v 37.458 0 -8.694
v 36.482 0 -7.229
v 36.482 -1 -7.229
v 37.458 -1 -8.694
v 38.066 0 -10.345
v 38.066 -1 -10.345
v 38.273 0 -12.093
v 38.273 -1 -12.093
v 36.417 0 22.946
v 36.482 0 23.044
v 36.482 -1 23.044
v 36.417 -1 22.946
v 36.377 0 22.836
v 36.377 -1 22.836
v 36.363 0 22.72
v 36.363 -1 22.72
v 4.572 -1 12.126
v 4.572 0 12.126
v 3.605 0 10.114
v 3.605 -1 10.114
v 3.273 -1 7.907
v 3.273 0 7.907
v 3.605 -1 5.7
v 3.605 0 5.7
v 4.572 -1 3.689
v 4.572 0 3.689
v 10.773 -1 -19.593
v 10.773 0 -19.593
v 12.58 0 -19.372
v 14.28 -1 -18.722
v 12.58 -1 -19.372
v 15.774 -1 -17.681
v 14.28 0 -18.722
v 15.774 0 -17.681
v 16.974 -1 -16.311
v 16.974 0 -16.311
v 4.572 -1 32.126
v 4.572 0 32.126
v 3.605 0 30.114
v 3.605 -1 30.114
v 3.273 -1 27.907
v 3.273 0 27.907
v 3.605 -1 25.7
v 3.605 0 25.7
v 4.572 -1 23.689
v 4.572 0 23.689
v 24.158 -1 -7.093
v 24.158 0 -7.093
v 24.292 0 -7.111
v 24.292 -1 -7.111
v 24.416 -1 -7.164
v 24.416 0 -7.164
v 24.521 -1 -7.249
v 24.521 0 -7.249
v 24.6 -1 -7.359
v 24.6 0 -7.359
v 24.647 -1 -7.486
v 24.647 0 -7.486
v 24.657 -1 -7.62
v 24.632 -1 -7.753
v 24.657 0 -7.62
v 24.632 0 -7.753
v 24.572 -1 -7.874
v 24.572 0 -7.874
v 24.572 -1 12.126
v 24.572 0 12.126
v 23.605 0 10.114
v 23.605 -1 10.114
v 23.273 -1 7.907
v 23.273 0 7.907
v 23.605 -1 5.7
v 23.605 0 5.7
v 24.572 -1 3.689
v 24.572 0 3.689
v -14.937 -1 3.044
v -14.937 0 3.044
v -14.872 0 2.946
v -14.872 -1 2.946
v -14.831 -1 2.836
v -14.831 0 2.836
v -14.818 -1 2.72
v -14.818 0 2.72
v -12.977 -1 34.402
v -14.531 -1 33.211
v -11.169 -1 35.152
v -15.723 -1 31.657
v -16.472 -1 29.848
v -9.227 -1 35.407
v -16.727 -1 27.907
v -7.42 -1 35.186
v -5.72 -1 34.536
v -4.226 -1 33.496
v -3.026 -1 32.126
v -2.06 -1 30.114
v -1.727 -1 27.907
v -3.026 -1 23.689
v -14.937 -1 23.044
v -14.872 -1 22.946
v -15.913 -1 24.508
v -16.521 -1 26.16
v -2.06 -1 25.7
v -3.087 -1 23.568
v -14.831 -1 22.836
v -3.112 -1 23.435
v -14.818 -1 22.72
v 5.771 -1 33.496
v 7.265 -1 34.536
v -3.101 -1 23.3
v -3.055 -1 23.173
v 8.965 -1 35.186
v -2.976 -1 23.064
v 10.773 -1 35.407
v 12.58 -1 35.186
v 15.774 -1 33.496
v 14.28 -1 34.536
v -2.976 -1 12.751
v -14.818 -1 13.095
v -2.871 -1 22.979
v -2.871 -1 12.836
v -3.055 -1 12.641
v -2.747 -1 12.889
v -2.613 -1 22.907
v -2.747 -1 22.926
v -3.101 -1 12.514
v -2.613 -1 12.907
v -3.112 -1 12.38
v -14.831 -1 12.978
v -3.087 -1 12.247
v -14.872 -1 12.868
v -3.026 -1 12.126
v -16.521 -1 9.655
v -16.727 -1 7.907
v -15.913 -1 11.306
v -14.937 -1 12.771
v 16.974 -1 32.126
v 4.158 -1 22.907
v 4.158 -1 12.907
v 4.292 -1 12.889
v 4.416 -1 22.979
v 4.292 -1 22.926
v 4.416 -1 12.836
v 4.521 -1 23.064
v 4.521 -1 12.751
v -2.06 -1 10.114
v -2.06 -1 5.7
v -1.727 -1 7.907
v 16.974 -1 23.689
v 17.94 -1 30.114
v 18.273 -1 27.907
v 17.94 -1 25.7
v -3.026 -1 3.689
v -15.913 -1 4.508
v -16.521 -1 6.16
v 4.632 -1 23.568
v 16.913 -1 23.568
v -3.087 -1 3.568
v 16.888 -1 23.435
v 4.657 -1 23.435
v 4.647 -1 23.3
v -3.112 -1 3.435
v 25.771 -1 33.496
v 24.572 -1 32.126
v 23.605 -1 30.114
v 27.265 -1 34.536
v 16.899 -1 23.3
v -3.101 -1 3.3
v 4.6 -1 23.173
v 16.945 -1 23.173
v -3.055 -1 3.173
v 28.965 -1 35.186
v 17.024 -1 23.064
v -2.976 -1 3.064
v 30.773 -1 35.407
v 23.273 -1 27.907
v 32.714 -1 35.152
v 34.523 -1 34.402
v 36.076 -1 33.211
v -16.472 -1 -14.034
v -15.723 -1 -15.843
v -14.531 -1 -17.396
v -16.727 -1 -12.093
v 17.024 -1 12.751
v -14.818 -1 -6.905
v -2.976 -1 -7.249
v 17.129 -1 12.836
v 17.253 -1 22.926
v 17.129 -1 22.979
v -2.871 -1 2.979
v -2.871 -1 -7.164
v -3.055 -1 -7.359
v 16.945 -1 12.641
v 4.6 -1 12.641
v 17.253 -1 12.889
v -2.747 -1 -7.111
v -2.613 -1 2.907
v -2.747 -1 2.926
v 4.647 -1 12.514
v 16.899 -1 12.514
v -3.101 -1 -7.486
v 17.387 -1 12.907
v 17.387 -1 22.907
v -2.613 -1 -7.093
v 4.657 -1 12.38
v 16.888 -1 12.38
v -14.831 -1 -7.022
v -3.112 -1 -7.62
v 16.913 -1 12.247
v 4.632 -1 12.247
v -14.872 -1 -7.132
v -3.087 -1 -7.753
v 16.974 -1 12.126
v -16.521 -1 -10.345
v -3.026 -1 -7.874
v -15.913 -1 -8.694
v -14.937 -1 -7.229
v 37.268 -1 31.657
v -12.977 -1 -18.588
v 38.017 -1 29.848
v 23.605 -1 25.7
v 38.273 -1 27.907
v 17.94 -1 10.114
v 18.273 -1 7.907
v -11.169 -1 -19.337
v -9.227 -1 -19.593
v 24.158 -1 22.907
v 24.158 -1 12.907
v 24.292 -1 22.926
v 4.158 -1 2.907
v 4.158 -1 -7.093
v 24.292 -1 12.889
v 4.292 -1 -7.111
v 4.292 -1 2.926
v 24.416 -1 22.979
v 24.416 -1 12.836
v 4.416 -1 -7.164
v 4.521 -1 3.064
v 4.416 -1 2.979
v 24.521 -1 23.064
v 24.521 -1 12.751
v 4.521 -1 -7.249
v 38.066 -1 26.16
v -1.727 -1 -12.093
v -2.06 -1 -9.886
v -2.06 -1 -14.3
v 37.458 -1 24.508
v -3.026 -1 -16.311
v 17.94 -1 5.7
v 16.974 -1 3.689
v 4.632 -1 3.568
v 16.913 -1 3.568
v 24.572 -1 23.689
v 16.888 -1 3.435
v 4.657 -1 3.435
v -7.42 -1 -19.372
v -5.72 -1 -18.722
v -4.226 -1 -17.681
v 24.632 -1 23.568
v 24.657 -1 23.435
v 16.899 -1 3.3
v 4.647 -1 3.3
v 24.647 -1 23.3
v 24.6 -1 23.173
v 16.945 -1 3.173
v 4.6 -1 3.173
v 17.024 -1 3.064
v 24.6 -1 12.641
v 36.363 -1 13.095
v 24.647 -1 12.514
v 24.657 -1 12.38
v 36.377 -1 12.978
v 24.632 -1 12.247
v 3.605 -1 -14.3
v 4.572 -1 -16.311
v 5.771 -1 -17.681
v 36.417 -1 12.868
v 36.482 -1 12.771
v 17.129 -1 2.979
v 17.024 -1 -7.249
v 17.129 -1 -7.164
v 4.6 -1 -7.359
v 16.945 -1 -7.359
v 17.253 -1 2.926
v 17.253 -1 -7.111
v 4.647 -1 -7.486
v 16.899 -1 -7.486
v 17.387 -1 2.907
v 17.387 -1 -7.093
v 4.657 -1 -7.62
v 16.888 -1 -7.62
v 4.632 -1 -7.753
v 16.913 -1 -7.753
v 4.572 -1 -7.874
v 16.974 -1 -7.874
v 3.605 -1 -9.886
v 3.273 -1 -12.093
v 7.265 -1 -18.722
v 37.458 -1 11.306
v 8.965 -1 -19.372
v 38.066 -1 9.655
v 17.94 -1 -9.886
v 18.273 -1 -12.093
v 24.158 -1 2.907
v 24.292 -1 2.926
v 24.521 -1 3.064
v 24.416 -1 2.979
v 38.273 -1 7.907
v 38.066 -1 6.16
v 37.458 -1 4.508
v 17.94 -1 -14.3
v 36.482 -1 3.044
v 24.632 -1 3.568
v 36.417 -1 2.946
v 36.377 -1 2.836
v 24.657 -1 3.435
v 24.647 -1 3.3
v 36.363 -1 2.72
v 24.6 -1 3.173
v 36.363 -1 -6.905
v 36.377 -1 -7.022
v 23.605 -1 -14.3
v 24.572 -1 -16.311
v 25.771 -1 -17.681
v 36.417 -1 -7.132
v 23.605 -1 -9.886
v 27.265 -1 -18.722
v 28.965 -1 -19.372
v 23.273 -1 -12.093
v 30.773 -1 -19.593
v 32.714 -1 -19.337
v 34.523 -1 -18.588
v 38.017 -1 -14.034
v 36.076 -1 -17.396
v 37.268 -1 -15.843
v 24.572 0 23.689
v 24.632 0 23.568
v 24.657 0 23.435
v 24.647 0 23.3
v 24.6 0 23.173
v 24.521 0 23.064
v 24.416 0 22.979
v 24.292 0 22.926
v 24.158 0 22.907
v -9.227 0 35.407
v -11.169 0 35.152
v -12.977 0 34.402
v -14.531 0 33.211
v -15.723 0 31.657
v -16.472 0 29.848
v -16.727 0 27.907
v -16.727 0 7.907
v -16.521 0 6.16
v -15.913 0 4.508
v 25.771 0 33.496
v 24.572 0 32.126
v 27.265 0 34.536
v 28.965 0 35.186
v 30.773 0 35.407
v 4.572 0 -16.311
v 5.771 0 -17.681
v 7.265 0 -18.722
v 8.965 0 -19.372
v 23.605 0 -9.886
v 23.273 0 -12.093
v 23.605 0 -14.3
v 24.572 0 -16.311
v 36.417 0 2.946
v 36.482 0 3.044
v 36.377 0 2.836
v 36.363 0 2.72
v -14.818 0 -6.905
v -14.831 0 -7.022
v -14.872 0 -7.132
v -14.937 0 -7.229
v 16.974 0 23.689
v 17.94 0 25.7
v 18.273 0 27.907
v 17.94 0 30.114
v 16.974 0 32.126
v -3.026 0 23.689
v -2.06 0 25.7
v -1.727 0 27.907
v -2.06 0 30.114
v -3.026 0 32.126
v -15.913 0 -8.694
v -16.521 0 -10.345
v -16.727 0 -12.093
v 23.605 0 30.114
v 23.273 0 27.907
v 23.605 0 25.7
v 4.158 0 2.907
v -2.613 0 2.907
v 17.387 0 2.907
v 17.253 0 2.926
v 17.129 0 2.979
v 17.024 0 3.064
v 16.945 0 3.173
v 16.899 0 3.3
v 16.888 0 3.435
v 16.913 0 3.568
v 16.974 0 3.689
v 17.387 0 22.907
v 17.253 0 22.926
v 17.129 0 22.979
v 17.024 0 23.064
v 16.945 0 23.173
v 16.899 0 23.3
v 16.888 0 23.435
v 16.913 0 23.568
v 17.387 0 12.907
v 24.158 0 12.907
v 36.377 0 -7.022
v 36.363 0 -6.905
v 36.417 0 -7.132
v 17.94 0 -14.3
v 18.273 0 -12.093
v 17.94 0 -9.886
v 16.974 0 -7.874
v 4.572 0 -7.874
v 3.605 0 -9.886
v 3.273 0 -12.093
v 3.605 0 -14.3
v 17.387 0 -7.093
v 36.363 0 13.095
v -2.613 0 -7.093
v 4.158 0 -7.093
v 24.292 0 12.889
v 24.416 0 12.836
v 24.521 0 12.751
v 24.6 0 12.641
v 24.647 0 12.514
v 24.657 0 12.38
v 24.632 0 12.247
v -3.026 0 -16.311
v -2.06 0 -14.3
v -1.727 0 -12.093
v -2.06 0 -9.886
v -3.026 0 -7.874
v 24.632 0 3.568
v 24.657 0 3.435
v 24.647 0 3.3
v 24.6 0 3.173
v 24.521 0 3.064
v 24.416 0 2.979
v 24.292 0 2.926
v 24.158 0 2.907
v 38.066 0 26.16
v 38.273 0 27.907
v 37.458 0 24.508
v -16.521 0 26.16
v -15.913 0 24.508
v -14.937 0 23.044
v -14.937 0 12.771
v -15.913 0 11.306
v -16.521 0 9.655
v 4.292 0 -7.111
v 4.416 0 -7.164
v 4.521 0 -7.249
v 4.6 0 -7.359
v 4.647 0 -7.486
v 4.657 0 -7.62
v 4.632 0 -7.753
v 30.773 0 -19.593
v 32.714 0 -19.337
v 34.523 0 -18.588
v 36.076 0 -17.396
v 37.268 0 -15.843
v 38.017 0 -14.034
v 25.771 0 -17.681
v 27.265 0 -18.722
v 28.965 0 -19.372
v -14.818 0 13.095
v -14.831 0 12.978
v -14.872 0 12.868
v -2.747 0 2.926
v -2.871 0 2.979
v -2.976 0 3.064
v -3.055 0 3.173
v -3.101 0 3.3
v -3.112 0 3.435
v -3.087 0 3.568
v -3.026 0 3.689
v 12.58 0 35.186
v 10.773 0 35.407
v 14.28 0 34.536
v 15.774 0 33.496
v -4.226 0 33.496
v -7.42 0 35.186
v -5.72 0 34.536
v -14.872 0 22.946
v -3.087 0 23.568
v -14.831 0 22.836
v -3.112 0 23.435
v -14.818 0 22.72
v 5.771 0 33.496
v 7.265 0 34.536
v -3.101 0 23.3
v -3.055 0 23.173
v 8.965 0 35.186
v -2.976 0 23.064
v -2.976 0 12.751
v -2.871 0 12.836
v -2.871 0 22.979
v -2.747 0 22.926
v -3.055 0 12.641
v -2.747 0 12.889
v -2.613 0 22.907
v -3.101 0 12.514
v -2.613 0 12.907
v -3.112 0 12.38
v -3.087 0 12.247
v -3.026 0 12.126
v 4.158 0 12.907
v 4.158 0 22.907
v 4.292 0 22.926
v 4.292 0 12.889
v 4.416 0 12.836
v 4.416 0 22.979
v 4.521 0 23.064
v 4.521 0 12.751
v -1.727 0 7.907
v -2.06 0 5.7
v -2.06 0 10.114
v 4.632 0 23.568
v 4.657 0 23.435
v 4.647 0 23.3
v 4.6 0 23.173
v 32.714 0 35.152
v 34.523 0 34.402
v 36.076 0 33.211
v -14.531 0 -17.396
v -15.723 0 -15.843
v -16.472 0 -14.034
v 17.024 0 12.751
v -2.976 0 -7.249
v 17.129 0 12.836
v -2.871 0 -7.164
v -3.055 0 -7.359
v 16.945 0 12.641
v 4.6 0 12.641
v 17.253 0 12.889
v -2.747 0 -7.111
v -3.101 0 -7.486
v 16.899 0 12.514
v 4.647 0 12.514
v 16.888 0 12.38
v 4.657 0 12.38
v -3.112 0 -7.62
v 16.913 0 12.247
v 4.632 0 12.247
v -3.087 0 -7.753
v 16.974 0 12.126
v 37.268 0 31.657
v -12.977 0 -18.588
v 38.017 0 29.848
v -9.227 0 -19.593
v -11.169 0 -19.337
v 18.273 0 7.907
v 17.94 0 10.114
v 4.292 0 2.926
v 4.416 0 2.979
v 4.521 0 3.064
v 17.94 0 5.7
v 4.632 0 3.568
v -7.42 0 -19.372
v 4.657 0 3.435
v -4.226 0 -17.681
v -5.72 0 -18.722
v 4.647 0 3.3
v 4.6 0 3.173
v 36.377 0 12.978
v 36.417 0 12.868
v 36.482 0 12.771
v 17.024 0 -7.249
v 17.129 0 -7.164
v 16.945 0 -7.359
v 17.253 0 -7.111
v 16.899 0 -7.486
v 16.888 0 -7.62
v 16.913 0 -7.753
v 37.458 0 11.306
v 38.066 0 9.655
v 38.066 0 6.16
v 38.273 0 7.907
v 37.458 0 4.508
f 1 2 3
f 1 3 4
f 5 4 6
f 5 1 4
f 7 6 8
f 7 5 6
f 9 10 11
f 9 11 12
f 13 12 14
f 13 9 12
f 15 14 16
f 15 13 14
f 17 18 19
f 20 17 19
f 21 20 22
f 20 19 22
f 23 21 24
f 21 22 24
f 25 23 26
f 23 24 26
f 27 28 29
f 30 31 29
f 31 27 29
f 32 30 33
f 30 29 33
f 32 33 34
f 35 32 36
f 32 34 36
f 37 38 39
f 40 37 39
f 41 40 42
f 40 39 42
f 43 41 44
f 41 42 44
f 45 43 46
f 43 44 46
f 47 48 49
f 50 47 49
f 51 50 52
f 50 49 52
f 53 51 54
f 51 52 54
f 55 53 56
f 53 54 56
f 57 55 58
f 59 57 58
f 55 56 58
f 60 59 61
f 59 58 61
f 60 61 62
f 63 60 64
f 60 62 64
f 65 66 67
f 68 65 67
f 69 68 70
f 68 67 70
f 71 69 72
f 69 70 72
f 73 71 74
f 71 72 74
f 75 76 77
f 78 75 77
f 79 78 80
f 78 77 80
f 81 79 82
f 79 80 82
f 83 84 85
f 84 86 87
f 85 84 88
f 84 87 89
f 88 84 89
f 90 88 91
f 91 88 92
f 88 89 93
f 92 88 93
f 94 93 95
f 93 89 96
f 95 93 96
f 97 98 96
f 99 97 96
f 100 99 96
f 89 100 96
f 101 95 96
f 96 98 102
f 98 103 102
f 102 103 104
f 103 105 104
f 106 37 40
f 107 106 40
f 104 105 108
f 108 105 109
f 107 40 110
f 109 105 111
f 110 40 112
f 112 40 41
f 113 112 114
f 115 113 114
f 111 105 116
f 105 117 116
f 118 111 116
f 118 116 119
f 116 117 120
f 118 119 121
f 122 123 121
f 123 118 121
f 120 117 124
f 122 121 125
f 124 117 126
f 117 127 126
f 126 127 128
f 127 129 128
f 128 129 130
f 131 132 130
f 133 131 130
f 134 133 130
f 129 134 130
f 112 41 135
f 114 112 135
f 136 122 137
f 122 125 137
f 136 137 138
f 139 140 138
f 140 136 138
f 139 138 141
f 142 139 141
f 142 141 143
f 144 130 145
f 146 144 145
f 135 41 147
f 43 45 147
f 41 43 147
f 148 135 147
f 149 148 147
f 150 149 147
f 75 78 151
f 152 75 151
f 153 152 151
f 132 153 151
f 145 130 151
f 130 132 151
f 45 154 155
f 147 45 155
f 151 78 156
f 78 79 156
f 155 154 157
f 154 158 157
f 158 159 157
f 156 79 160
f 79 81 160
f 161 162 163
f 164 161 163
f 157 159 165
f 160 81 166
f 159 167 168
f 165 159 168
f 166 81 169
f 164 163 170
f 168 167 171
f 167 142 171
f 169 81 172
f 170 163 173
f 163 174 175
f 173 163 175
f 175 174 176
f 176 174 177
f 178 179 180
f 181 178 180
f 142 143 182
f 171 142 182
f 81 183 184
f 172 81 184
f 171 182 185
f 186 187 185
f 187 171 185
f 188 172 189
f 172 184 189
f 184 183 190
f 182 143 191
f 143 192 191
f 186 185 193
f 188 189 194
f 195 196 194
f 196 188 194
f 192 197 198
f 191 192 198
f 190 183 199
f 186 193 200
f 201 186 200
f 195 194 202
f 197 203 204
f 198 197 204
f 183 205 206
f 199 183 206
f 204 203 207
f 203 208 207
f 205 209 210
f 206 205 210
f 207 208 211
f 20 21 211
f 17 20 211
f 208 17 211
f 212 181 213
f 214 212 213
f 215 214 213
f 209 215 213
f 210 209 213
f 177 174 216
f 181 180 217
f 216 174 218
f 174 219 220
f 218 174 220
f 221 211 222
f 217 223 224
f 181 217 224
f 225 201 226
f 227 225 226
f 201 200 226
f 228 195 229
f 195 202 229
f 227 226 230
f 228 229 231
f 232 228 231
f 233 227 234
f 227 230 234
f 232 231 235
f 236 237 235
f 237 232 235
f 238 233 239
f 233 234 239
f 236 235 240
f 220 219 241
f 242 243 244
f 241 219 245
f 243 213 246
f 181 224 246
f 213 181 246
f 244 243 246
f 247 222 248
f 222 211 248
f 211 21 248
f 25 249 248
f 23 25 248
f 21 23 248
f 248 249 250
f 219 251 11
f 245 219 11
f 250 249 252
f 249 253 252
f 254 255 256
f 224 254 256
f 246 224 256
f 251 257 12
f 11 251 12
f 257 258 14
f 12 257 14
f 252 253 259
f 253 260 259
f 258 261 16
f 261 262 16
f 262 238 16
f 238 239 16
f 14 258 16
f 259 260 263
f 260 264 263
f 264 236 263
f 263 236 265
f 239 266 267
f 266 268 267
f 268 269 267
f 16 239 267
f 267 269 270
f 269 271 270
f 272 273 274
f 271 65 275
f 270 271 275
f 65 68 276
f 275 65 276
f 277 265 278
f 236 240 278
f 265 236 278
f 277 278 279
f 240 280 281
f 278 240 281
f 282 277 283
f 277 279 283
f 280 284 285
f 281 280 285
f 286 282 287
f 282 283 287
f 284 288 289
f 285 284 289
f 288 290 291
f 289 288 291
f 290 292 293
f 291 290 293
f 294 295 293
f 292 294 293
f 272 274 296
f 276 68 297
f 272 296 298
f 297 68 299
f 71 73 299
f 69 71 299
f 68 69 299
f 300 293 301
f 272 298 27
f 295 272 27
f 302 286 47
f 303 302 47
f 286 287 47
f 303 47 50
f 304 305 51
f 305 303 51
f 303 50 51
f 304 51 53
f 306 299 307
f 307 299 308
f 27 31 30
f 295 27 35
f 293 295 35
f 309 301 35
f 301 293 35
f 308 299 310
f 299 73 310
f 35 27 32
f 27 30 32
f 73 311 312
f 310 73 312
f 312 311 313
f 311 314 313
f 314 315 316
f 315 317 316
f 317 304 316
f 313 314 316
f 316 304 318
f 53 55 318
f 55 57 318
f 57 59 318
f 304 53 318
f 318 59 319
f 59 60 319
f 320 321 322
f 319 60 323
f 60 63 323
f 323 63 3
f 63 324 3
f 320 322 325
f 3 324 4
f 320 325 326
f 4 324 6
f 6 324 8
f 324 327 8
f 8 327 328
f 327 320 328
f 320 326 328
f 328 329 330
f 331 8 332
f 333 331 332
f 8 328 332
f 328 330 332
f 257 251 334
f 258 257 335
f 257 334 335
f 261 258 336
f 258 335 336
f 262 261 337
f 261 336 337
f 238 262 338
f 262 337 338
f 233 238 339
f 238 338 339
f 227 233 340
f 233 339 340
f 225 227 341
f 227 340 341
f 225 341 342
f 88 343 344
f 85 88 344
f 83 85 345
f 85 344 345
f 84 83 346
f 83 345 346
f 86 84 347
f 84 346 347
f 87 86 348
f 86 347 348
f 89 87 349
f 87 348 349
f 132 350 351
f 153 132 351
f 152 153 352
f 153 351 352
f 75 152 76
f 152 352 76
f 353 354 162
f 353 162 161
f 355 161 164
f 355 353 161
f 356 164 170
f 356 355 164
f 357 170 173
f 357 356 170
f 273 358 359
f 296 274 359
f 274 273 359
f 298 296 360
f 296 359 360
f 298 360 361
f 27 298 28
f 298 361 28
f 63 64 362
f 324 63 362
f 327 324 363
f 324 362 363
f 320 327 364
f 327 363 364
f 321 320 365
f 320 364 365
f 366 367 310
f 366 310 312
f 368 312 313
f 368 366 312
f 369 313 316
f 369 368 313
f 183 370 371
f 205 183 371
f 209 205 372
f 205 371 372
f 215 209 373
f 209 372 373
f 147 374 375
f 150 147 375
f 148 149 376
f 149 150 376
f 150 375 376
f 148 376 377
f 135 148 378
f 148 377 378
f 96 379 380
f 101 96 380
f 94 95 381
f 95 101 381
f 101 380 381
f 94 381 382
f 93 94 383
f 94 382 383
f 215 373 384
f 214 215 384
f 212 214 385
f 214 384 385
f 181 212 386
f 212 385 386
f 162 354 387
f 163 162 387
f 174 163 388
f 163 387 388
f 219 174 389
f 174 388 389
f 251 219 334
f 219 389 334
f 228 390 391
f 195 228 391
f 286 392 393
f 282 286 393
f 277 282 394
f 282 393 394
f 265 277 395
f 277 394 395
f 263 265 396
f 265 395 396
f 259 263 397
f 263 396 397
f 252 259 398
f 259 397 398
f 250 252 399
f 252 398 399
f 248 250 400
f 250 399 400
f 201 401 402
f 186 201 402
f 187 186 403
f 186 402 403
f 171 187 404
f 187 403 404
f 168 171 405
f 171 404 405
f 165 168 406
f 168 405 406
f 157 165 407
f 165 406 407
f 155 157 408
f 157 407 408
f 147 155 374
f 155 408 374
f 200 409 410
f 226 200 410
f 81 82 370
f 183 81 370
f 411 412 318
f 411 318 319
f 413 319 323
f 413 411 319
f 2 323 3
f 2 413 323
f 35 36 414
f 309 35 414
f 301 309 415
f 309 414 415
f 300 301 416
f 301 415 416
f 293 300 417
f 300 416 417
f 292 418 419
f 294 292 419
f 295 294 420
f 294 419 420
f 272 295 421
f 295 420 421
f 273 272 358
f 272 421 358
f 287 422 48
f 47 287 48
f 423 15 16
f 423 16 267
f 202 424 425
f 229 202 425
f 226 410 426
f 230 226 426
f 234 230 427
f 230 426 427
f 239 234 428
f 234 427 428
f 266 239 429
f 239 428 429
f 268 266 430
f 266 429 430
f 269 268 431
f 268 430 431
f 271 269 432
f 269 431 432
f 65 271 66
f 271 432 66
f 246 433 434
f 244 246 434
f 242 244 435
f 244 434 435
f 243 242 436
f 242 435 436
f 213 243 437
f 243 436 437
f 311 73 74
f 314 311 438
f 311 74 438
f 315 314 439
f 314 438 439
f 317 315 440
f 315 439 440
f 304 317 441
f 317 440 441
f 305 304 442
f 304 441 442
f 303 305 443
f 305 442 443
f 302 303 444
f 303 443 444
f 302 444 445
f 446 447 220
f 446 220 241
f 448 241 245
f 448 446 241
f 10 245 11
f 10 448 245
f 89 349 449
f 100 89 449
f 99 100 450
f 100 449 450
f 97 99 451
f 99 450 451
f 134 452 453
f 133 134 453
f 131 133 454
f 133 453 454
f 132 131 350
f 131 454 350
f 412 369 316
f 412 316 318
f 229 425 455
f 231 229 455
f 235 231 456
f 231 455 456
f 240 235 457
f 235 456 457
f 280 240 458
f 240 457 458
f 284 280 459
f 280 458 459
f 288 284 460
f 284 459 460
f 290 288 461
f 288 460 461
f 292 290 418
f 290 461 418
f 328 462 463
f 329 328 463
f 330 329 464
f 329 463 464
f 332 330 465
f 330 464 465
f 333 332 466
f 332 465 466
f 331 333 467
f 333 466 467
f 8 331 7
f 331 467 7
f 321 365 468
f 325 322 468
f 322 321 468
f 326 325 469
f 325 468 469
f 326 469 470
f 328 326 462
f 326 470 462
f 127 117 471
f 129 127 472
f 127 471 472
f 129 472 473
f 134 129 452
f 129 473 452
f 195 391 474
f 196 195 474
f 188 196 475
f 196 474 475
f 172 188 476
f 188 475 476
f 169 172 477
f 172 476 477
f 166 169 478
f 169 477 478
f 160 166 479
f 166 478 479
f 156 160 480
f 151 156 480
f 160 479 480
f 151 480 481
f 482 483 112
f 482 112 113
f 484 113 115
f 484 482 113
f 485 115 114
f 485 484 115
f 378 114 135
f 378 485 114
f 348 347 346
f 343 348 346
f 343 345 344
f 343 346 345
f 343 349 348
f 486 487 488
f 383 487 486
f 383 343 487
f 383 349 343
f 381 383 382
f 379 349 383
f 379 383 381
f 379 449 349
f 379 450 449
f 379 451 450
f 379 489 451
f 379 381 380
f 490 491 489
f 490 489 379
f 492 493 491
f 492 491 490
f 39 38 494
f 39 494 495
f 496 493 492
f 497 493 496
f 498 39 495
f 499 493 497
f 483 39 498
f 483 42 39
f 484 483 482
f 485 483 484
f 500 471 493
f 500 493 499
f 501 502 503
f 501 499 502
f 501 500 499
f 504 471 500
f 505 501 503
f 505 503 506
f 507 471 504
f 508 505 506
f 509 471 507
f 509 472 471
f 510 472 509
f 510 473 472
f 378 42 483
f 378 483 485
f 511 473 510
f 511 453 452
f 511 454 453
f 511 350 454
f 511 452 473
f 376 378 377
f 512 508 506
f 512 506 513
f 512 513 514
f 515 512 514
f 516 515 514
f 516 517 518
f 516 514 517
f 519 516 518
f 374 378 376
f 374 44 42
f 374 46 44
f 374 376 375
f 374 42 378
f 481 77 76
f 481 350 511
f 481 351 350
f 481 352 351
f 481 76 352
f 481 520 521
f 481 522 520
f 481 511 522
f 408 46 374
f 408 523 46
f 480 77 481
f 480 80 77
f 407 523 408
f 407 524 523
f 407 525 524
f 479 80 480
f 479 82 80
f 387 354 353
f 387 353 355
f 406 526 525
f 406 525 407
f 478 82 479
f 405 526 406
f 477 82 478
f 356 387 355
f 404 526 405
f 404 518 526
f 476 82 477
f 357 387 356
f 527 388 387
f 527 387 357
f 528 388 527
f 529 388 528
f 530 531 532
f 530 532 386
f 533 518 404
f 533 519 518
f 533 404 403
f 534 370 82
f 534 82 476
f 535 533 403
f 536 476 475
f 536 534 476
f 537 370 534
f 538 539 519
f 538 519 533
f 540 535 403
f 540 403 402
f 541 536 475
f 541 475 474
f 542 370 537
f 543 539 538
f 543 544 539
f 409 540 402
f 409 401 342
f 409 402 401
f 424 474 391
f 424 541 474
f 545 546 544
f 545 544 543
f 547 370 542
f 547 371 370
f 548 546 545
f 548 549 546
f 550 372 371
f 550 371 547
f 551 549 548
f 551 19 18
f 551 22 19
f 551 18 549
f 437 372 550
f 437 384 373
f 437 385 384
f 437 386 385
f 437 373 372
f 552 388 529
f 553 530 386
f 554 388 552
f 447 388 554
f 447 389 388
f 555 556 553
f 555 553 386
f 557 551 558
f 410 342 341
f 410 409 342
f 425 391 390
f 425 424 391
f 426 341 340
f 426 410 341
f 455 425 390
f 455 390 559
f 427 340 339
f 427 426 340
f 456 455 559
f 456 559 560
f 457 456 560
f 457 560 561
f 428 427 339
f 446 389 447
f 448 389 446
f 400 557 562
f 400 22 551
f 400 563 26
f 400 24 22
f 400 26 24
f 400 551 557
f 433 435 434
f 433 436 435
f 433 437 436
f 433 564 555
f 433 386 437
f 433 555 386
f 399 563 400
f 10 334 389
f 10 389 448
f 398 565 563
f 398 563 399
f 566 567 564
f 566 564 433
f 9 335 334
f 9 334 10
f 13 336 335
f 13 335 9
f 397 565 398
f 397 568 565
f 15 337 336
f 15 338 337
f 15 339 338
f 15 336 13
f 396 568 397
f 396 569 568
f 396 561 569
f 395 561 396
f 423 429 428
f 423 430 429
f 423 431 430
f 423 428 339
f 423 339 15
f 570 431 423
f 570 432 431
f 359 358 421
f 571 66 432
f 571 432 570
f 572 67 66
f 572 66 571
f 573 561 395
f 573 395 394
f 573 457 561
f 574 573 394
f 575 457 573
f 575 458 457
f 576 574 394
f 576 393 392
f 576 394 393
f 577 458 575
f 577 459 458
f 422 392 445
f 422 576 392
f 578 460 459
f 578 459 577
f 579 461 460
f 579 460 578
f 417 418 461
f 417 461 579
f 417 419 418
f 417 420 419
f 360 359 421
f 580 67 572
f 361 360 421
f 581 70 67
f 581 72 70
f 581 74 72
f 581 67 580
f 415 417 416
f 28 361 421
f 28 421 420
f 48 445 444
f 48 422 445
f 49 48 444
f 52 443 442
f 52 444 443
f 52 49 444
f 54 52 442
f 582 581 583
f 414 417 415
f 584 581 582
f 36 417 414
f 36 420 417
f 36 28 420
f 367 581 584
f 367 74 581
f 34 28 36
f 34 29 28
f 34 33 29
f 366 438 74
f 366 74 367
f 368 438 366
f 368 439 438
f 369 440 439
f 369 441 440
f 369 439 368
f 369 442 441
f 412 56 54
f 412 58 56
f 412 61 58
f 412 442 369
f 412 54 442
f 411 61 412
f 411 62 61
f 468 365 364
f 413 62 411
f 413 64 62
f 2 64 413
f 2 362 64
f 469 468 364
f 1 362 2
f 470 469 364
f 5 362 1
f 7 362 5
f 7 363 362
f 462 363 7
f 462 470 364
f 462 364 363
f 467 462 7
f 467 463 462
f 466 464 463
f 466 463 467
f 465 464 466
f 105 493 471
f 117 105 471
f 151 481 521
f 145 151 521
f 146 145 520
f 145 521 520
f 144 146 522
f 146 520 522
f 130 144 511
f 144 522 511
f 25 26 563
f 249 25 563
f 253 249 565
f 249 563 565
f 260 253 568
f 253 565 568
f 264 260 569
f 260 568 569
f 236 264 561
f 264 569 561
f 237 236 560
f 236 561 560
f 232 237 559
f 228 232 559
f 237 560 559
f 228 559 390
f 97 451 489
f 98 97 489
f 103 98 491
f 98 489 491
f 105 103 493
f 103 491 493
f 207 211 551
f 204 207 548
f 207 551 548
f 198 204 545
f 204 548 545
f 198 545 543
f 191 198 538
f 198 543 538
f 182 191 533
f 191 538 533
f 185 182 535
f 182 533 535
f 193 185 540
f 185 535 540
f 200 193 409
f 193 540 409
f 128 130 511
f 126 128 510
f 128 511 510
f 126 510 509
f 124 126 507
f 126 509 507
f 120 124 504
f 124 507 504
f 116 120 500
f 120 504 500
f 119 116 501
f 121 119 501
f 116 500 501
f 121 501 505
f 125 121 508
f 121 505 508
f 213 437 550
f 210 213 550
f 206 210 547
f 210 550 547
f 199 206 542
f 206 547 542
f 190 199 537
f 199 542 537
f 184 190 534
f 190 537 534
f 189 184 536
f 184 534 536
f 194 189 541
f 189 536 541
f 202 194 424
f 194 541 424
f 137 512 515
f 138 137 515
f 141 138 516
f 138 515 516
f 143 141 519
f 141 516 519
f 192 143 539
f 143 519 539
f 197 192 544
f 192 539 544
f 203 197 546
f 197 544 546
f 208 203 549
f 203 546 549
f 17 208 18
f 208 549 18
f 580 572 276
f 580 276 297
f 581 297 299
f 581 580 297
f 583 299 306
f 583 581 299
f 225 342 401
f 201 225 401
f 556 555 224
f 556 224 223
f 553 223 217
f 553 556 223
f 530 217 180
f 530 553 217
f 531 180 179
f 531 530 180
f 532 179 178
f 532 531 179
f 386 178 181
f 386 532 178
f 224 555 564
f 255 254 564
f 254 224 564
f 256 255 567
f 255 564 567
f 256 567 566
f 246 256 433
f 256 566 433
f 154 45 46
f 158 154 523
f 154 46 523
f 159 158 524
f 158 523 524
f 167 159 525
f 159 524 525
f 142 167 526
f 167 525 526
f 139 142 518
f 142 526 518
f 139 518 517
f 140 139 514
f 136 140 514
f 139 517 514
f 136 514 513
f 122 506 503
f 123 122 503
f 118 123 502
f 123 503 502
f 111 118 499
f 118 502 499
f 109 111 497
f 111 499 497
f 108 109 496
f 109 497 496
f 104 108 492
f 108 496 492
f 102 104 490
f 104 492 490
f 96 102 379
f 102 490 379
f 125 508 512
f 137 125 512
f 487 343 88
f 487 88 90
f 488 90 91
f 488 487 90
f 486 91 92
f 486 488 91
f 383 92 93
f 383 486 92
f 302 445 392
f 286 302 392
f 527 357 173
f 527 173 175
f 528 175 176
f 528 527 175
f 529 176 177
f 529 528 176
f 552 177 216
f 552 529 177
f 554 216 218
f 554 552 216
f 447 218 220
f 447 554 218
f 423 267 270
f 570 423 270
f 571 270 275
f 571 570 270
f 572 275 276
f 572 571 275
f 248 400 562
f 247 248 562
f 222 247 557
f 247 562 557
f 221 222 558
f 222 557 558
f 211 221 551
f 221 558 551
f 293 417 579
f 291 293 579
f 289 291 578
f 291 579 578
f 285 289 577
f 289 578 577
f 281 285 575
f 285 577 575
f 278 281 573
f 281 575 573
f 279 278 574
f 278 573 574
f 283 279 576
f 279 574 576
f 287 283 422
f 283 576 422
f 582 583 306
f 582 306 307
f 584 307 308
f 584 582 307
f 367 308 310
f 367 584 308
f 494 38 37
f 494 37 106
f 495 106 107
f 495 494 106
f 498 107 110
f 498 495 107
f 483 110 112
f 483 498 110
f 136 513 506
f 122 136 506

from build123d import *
from build123d.topology import SkipClean

# Parameters (mm, degrees)
L_U_BR_IST_W               = 55
L_U_BR_IST_H               = 55
AUFSATZ_LIN_GK_DEPTH       = 1
SCHNITT_LIN_S1_DEPTH       = 2
SCHNITT_LIN_S2_DEPTH       = 2
SCHNITT_LIN_S3_DEPTH       = 2
SCHNITT_LIN_S4_DEPTH       = 2
LIN_MUSTER_S1_COUNT        = 2
LIN_MUSTER_S1_PITCH        = 20
LIN_MUSTER_S1_COUNT_DIR2   = 3
LIN_MUSTER_S1_PITCH_DIR2   = 20
LIN_MUSTER_S2_COUNT        = 2
LIN_MUSTER_S2_PITCH        = 20
LIN_MUSTER_S3_COUNT        = 2
LIN_MUSTER_S3_PITCH        = 20
SPIEGELN_S4_Z_COPY_1_DEPTH = 2
SPIEGELN_S2_COPY_1_DEPTH   = 2
SPIEGELN_S3_COPY_1_DEPTH   = 2
SPIEGELN_S3_COPY_2_DEPTH   = 2


with BuildPart() as part:
    # L_ u Br Ist → Aufsatz-Lin_GK (new body)
    with BuildSketch(Plane(origin=(0, 0, 0), x_dir=(1, 0, 0), z_dir=(0, 1, 0))):
        with Locations((10.772595927, -7.907273432)):
            Rectangle(L_U_BR_IST_W, L_U_BR_IST_H)
    extrude(amount=-AUFSATZ_LIN_GK_DEPTH)

    # Sketch S1 → Schnitt-Lin_S1 (cut, through all)
    with BuildSketch(Plane(origin=(0, 0, 0), x_dir=(1, 0, 0), z_dir=(0, 1, 0))):
        with BuildLine():
            Line((-2.613025796, 7.092726568), (4.158217649, 7.092726568))
            ThreePointArc((4.158217649, 7.092726568), (4.600159387, 7.358872981), (4.571616291, 7.873976568))
            ThreePointArc((4.571616291, 7.873976568), (3.272595927, 12.092726568), (4.571616291, 16.311476568))
            ThreePointArc((4.571616291, 16.311476568), (4.600159387, 16.826580155), (4.158217649, 17.092726568))
            Line((4.158217649, 17.092726568), (-2.613025796, 17.092726568))
            ThreePointArc((-2.613025796, 17.092726568), (-3.054967534, 16.826580155), (-3.026424438, 16.311476568))
            ThreePointArc((-3.026424438, 16.311476568), (-1.727404073, 12.092726568), (-3.026424438, 7.873976568))
            ThreePointArc((-3.026424438, 7.873976568), (-3.054967534, 7.358872981), (-2.613025796, 7.092726568))
        make_face()
    schnitt_lin_s1 = extrude(amount=-SCHNITT_LIN_S1_DEPTH, mode=Mode.SUBTRACT)

    # Sketch S2 → Schnitt-Lin_S2 (cut, through all)
    with BuildSketch(Plane(origin=(0, 0, 0), x_dir=(1, 0, 0), z_dir=(0, 1, 0))):
        with BuildLine():
            Line((-14.817574017, -2.719804872), (-14.817574017, 6.905258008))
            ThreePointArc((-14.817574017, 6.905258008), (-14.848363078, 7.07800376), (-14.936938396, 7.229474793))
            ThreePointArc((-14.936938396, 7.229474793), (-16.26556816, 9.501540297), (-16.727404073, 12.092726568))
            Line((-16.727404073, 12.092726568), (-16.727404073, -7.907273432))
            ThreePointArc((-16.727404073, -7.907273432), (-16.26556816, -5.316087161), (-14.936938396, -3.044021657))
            ThreePointArc((-14.936938396, -3.044021657), (-14.848363078, -2.892550624), (-14.817574017, -2.719804872))
        make_face()
    schnitt_lin_s2 = extrude(amount=-SCHNITT_LIN_S2_DEPTH, mode=Mode.SUBTRACT)

    # Sketch S3 → Schnitt-Lin_S3 (cut, through all)
    with BuildSketch(Plane(origin=(0, 0, 0), x_dir=(1, 0, 0), z_dir=(0, 1, 0))):
        with BuildLine():
            Line((-3.026424438, 16.311476568), (4.571616291, 16.311476568))
            ThreePointArc((4.571616291, 16.311476568), (7.264792127, 18.721852642), (10.772595927, 19.592726568))
            Line((10.772595927, 19.592726568), (-9.227404073, 19.592726568))
            ThreePointArc((-9.227404073, 19.592726568), (-5.719600273, 18.721852642), (-3.026424438, 16.311476568))
        make_face()
    schnitt_lin_s3 = extrude(amount=-SCHNITT_LIN_S3_DEPTH, mode=Mode.SUBTRACT)

    # Sketch S4 → Schnitt-Lin_S4 (cut, through all)
    with SkipClean():  # keep this step's faces unmerged: merging them makes the solid invalid here
        with BuildSketch(Plane(origin=(0, 0, 0), x_dir=(1, 0, 0), z_dir=(0, 1, 0))):
            with BuildLine():
                Line((-16.727404073, 12.092726568), (-16.727404073, 19.592726568))
                Line((-16.727404073, 19.592726568), (-9.227404073, 19.592726568))
                ThreePointArc((-9.227404073, 19.592726568), (-14.530704932, 17.396027427), (-16.727404073, 12.092726568))
            make_face()
        schnitt_lin_s4 = extrude(amount=-SCHNITT_LIN_S4_DEPTH, mode=Mode.SUBTRACT)

    # Lin Muster_S1: Schnitt-Lin_S1 2 × 3
    with SkipClean():  # keep this step's faces unmerged: merging them makes the solid invalid here
        with Locations(*[(i * LIN_MUSTER_S1_PITCH, 0, j * LIN_MUSTER_S1_PITCH_DIR2) for i in range(LIN_MUSTER_S1_COUNT) for j in range(LIN_MUSTER_S1_COUNT_DIR2) if (i, j) != (0, 0)]):
            add(schnitt_lin_s1, mode=Mode.SUBTRACT)

    # Lin Muster_S2: Schnitt-Lin_S2 ×2
    with SkipClean():  # keep this step's faces unmerged: merging them makes the solid invalid here
        with Locations(*[(0, 0, i * LIN_MUSTER_S2_PITCH) for i in range(1, LIN_MUSTER_S2_COUNT)]):
            add(schnitt_lin_s2, mode=Mode.SUBTRACT)

    # Lin Muster_S3: Schnitt-Lin_S3 ×2
    with SkipClean():  # keep this step's faces unmerged: merging them makes the solid invalid here
        with Locations(*[(i * LIN_MUSTER_S3_PITCH, 0, 0) for i in range(1, LIN_MUSTER_S3_COUNT)]):
            add(schnitt_lin_s3, mode=Mode.SUBTRACT)

    # Spiegeln_S4 X: Schnitt-Lin_S4 across plane
    with SkipClean():  # keep this step's faces unmerged: merging them makes the solid invalid here
        add(schnitt_lin_s4.mirror(Plane.ZY.offset(-10.772595927)), mode=Mode.SUBTRACT)

    # Spiegeln_S4 Z: Schnitt-Lin_S4 across plane
    with SkipClean():  # keep this step's faces unmerged: merging them makes the solid invalid here
        add(schnitt_lin_s4.mirror(Plane.XY.offset(7.907273432)), mode=Mode.SUBTRACT)

    # Spiegeln_S4 Z copy 1 sketch → Spiegeln_S4 Z copy 1 (cut, through all)
    with SkipClean():  # keep this step's faces unmerged: merging them makes the solid invalid here
        with BuildSketch(Plane(origin=(21.545191853, 0, 15.814546864), x_dir=(-1, 0, 0), z_dir=(0, 1, 0))):
            with BuildLine():
                Line((-16.727404073, 12.092726568), (-16.727404073, 19.592726568))
                Line((-16.727404073, 19.592726568), (-9.227404073, 19.592726568))
                ThreePointArc((-9.227404073, 19.592726568), (-14.530704932, 17.396027427), (-16.727404073, 12.092726568))
            make_face()
        extrude(amount=-SPIEGELN_S4_Z_COPY_1_DEPTH, mode=Mode.SUBTRACT)

    # Spiegeln_S2: Schnitt-Lin_S2 across plane
    with SkipClean():  # keep this step's faces unmerged: merging them makes the solid invalid here
        add(schnitt_lin_s2.mirror(Plane.ZY.offset(-10.772595927)), mode=Mode.SUBTRACT)

    # Spiegeln_S2 copy 1 sketch → Spiegeln_S2 copy 1 (cut, through all)
    with SkipClean():  # keep this step's faces unmerged: merging them makes the solid invalid here
        with BuildSketch(Plane(origin=(21.545191853, 0, 20), x_dir=(-1, 0, 0), z_dir=(0, 1, 0))):
            with BuildLine():
                Line((-14.817574017, 2.719804872), (-14.817574017, -6.905258008))
                ThreePointArc((-14.817574017, -6.905258008), (-14.848363078, -7.07800376), (-14.936938396, -7.229474793))
                ThreePointArc((-14.936938396, -7.229474793), (-16.26556816, -9.501540297), (-16.727404073, -12.092726568))
                Line((-16.727404073, -12.092726568), (-16.727404073, 7.907273432))
                ThreePointArc((-16.727404073, 7.907273432), (-16.26556816, 5.316087161), (-14.936938396, 3.044021657))
                ThreePointArc((-14.936938396, 3.044021657), (-14.848363078, 2.892550624), (-14.817574017, 2.719804872))
            make_face()
        extrude(amount=-SPIEGELN_S2_COPY_1_DEPTH, mode=Mode.SUBTRACT)

    # Spiegeln_S3 copy 1 sketch → Spiegeln_S3 copy 1 (cut, through all)
    with SkipClean():  # keep this step's faces unmerged: merging them makes the solid invalid here
        with BuildSketch(Plane(origin=(20, 0, 15.814546864), x_dir=(1, 0, 0), z_dir=(0, 1, 0))):
            with BuildLine():
                Line((-3.026424438, -16.311476568), (4.571616291, -16.311476568))
                ThreePointArc((4.571616291, -16.311476568), (7.264792127, -18.721852642), (10.772595927, -19.592726568))
                Line((10.772595927, -19.592726568), (-9.227404073, -19.592726568))
                ThreePointArc((-9.227404073, -19.592726568), (-5.719600273, -18.721852642), (-3.026424438, -16.311476568))
            make_face()
        extrude(amount=-SPIEGELN_S3_COPY_1_DEPTH, mode=Mode.SUBTRACT)

    # Spiegeln_S3 copy 2 sketch → Spiegeln_S3 copy 2 (cut, through all)
    with SkipClean():  # keep this step's faces unmerged: merging them makes the solid invalid here
        with BuildSketch(Plane(origin=(0, 0, 15.814546864), x_dir=(1, 0, 0), z_dir=(0, 1, 0))):
            with BuildLine():
                Line((-3.026424438, -16.311476568), (4.571616291, -16.311476568))
                ThreePointArc((4.571616291, -16.311476568), (7.264792127, -18.721852642), (10.772595927, -19.592726568))
                Line((10.772595927, -19.592726568), (-9.227404073, -19.592726568))
                ThreePointArc((-9.227404073, -19.592726568), (-5.719600273, -18.721852642), (-3.026424438, -16.311476568))
            make_face()
        extrude(amount=-SPIEGELN_S3_COPY_2_DEPTH, mode=Mode.SUBTRACT)


solid = part.part
